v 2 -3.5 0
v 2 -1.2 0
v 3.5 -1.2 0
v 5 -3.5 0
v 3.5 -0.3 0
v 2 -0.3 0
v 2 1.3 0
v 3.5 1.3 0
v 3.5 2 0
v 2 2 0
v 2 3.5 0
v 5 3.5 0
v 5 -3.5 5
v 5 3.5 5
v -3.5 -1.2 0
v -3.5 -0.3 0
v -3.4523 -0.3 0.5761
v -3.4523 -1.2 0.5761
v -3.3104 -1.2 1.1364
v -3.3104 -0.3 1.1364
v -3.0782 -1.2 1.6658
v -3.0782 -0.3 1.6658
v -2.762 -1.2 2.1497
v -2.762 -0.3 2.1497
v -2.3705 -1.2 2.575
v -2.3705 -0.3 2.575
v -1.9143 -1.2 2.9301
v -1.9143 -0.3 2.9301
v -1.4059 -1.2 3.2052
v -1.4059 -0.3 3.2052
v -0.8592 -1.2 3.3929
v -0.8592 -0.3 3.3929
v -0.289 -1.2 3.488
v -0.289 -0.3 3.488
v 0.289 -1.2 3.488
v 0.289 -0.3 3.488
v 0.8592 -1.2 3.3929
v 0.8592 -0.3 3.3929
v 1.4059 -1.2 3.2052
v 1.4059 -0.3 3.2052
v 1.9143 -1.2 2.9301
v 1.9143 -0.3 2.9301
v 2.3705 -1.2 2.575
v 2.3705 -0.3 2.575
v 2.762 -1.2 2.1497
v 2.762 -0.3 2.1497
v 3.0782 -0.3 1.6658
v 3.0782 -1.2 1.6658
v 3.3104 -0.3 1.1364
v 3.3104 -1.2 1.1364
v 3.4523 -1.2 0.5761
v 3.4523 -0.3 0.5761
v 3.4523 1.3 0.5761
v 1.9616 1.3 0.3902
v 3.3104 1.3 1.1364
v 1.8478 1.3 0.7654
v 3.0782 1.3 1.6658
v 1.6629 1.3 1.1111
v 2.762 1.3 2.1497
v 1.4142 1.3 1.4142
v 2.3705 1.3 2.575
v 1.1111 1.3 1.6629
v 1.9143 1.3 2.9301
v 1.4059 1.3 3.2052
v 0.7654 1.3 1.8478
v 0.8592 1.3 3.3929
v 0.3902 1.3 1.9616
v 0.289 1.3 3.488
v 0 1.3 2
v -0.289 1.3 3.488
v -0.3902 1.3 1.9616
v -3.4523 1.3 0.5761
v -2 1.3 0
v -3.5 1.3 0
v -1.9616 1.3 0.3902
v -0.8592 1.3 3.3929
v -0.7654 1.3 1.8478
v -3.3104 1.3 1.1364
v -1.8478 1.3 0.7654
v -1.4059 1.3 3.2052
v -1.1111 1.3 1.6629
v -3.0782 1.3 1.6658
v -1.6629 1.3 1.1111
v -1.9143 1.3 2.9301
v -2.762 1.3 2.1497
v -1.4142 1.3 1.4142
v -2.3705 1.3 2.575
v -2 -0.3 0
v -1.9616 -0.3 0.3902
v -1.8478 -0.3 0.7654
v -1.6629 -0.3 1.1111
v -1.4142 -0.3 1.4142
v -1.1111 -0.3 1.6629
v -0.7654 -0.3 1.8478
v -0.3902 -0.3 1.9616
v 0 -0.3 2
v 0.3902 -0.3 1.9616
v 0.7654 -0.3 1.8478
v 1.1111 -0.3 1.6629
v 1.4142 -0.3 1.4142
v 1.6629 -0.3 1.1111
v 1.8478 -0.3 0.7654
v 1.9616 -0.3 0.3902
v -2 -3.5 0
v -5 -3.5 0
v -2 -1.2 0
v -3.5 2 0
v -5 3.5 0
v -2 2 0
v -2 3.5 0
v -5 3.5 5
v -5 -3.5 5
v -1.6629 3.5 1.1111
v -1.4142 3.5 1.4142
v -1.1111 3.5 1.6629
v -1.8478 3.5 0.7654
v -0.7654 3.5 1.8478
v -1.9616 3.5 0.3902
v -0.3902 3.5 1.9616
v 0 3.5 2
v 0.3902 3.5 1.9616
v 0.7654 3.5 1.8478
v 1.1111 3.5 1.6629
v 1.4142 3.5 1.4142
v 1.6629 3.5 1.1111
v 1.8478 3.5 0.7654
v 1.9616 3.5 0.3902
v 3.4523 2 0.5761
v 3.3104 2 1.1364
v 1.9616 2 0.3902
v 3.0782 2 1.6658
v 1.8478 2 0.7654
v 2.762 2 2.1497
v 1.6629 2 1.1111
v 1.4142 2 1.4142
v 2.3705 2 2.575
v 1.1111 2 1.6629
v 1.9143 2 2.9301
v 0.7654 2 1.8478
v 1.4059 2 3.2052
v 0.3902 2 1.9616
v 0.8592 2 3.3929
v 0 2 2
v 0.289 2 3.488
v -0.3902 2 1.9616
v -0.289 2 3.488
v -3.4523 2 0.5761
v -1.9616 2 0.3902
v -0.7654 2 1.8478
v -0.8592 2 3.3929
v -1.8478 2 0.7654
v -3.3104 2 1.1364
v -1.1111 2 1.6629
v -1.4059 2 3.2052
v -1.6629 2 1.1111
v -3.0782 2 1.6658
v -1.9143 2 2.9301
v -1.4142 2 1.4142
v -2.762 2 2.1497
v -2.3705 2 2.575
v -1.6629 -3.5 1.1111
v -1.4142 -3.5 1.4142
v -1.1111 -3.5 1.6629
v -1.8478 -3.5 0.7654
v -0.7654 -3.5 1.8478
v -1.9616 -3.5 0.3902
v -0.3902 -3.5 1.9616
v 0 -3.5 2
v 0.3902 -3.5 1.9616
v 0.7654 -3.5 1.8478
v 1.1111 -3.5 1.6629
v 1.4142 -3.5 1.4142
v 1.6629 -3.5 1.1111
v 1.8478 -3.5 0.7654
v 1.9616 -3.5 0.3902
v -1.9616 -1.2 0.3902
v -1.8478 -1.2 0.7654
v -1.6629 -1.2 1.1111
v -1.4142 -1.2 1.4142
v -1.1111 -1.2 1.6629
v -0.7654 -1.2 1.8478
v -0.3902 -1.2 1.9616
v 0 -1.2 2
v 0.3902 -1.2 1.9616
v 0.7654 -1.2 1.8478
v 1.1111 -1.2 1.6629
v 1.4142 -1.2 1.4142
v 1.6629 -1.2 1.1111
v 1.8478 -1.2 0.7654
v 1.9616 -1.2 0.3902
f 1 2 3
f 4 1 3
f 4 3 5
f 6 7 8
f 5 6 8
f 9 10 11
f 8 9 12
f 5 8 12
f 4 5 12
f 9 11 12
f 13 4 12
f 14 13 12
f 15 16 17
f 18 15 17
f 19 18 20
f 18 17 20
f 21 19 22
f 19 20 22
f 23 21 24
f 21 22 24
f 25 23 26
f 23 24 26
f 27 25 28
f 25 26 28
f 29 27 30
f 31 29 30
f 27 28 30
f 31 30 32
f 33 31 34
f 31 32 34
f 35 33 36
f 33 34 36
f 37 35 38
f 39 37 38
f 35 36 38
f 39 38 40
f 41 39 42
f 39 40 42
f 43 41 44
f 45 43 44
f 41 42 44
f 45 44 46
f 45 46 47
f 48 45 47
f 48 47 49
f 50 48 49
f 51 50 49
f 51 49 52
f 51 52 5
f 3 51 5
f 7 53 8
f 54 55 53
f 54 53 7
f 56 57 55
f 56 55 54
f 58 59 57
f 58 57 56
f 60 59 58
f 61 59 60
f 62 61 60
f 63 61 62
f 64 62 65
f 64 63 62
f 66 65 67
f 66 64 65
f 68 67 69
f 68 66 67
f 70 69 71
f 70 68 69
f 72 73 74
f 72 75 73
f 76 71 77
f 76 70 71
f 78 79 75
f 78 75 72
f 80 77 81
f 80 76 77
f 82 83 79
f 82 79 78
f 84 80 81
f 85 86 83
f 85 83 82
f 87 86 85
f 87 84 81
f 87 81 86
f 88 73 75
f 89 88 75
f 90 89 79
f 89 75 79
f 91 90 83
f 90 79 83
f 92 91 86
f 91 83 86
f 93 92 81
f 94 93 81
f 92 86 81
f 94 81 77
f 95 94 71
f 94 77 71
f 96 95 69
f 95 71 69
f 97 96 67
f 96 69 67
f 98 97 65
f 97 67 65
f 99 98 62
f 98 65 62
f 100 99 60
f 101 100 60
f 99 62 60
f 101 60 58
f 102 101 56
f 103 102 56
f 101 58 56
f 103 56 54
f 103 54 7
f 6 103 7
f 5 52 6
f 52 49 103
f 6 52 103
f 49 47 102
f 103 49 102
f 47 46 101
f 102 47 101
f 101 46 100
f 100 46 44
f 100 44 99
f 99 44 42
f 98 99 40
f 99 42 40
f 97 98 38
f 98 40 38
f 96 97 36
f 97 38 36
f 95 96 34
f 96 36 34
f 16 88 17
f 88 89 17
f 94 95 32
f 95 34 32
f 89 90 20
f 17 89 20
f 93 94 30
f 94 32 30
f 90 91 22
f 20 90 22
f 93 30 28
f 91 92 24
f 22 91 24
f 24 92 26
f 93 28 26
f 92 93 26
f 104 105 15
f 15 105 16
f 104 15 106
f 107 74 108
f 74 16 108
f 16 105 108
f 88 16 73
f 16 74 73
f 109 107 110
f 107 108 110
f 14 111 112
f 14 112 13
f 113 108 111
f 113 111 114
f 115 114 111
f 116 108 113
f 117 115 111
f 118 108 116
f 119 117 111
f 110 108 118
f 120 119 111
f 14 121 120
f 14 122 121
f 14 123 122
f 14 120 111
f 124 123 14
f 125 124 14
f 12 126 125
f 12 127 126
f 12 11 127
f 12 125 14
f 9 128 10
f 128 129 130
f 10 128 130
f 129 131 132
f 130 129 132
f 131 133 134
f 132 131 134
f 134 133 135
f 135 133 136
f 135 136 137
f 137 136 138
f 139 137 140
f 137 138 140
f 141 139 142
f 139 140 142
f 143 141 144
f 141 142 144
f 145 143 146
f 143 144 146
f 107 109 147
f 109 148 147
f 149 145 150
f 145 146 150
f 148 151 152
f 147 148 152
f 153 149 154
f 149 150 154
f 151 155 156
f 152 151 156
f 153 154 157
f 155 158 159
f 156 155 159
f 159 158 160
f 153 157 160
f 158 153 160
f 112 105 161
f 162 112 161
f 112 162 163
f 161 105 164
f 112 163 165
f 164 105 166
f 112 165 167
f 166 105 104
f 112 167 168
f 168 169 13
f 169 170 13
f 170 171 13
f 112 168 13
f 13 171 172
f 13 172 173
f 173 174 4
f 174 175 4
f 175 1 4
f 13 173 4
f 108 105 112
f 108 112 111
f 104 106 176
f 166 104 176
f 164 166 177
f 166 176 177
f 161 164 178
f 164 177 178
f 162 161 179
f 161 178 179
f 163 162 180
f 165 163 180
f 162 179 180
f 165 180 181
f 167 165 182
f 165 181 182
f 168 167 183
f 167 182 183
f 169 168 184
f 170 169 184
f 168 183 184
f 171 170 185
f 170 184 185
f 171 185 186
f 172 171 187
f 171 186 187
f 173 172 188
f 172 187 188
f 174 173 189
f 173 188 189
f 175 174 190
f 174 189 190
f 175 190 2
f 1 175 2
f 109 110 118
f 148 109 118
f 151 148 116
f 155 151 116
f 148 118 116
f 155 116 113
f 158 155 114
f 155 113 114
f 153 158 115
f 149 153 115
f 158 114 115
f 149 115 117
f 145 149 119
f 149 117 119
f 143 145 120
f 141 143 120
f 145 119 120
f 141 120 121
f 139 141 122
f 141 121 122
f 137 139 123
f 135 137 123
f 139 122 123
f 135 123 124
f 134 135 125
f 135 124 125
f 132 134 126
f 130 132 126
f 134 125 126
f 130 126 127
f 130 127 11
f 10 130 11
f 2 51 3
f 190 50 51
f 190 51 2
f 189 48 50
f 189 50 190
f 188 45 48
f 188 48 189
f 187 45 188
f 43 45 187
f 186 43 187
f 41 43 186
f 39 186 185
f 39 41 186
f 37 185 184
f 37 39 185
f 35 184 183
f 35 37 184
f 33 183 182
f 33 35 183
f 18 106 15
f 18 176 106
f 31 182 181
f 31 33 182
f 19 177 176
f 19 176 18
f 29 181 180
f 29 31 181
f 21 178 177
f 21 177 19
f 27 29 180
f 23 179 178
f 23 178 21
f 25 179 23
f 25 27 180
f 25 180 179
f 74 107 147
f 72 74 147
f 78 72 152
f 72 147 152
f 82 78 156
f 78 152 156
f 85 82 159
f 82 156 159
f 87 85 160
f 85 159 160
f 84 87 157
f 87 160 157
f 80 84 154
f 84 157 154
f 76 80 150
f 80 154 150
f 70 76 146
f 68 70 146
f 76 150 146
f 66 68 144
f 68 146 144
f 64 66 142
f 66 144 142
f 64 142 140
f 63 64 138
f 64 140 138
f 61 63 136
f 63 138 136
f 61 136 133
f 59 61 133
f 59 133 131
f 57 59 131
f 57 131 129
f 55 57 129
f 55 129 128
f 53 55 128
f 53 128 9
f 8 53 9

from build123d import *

# Parameters (mm, degrees)
F0_W     = 10
F0_H     = 7
F1_DEPTH = 5
F3_DEPTH = 7
F5_R     = 3.5
F6_DEPTH = 0.7
F8_R     = 3.5
F9_DEPTH = 0.9


with BuildPart() as f1:
    # F0 (on Top) → F1 (new body)
    with BuildSketch(Plane.XY):
        Rectangle(F0_W, F0_H)
    extrude(amount=F1_DEPTH)

    # F2 (on face) → F3 (cut, through all)
    with BuildSketch(Plane(origin=(0, 3.5, 0), x_dir=(-1, 0, 0), z_dir=(0, 1, 0))):
        with BuildLine():
            Line((-2, 0), (2, 0))
            ThreePointArc((2, 0), (0, 2), (-2, 0))
        make_face()
    extrude(amount=-F3_DEPTH, mode=Mode.SUBTRACT)

    # F5 (on offset) → F6 (cut)
    with BuildSketch(Plane(origin=(0, 2, 0), x_dir=(-1, 0, 0), z_dir=(0, 1, 0))):
        Circle(F5_R)
    extrude(amount=-F6_DEPTH, mode=Mode.SUBTRACT)

    # F8 (on offset) → F9 (cut)
    with BuildSketch(Plane(origin=(0, -0.3, 0), x_dir=(-1, 0, 0), z_dir=(0, 1, 0))):
        Circle(F8_R)
    extrude(amount=-F9_DEPTH, mode=Mode.SUBTRACT)


solid = f1.part
